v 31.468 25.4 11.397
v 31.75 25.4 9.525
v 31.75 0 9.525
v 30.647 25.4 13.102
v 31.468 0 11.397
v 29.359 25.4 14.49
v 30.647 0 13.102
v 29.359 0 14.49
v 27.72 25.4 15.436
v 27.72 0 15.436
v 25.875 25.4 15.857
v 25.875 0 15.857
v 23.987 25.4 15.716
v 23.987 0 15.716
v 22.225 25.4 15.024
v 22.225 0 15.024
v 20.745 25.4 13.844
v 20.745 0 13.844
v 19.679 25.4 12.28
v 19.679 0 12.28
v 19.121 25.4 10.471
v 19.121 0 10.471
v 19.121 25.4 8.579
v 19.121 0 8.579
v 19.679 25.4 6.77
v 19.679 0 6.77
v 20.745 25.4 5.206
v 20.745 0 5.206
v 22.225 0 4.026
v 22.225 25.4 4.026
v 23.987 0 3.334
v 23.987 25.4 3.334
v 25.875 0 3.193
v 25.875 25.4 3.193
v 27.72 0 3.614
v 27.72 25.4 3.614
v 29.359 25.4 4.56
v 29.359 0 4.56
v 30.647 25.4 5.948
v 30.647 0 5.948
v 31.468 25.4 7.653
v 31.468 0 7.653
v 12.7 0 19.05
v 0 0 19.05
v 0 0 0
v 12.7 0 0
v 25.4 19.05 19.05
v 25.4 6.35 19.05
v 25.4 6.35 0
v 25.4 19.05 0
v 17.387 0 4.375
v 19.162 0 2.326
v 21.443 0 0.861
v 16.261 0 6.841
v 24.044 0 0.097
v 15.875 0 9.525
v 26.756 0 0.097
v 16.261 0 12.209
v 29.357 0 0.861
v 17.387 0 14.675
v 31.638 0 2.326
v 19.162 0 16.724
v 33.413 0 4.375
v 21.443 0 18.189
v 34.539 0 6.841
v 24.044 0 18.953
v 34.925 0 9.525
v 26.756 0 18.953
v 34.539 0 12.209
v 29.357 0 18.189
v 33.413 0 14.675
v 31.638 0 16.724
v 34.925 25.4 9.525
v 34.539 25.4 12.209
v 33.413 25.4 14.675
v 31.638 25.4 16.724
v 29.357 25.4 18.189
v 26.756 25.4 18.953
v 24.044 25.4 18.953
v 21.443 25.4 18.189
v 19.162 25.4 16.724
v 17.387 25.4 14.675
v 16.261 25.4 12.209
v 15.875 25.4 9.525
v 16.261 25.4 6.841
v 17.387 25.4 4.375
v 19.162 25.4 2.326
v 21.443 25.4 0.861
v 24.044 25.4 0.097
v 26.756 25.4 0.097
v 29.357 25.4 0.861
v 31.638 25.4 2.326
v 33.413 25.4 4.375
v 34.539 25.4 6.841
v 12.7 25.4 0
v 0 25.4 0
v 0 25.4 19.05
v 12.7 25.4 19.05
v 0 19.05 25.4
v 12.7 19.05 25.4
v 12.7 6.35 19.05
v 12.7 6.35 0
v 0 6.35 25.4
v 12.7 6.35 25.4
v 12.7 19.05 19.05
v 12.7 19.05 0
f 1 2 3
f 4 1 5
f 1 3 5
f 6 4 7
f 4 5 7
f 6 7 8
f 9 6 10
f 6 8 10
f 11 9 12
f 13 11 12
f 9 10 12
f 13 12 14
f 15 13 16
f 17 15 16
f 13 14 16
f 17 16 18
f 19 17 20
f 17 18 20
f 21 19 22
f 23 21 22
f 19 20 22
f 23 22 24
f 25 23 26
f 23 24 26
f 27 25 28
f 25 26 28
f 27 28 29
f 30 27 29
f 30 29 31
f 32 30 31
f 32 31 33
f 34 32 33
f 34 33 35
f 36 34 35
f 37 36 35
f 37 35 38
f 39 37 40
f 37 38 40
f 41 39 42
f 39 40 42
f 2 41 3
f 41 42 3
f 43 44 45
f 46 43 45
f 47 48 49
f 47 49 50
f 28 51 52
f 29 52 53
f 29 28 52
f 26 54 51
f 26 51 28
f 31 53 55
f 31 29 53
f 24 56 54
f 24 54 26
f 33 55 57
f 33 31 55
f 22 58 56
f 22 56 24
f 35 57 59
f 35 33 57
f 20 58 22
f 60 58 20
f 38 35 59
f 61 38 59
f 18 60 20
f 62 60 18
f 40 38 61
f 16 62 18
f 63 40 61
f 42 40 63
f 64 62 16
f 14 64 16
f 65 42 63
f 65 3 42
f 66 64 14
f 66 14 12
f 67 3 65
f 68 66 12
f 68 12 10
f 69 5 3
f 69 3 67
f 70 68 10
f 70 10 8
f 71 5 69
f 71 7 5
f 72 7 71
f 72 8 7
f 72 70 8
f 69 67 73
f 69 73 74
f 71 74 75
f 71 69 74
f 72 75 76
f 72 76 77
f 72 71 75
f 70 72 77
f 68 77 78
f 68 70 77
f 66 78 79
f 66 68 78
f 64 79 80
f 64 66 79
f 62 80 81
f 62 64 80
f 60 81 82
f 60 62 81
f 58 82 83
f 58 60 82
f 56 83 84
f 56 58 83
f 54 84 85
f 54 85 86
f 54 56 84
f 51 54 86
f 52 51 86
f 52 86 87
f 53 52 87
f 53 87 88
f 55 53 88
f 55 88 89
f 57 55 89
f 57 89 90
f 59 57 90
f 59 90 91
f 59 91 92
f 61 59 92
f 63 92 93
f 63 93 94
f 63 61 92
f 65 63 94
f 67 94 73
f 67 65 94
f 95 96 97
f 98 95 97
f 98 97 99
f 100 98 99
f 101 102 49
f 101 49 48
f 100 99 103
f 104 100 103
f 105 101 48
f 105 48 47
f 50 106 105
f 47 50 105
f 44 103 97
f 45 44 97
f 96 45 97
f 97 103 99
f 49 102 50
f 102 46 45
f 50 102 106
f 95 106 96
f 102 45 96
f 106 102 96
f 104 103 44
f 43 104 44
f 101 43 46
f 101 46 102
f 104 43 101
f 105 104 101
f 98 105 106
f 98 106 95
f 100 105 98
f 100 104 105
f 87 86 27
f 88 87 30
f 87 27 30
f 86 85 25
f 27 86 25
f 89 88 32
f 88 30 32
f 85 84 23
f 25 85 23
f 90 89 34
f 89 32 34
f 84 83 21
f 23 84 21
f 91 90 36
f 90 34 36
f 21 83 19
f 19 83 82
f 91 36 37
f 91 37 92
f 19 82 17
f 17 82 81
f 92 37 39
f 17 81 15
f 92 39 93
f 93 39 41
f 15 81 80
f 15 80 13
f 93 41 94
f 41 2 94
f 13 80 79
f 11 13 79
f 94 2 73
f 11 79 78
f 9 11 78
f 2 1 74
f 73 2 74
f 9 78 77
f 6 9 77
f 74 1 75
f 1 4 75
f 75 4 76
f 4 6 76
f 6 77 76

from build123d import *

# Parameters (mm, degrees)
F1_DEPTH = 12.7
F2_W     = 12.7
F2_H     = 19.05
F3_DEPTH = 25.4
F4_R     = 9.525
F5_DEPTH = 25.4
F6_R     = 6.35
F7_DEPTH = 25.4


with BuildPart() as f1:
    # F0 (on Right) → F1 (new body)
    with BuildSketch(Plane.YZ):
        Polygon((0, 19.05), (0, 0), (25.4, 0), (25.4, 19.05), (19.05, 25.4), (6.35, 25.4), align=None)
    extrude(amount=F1_DEPTH)

    # F2 (on Right) → F3 (join)
    with BuildSketch(Plane.YZ):
        with Locations((12.7, 9.525)):
            Rectangle(F2_W, F2_H)
    extrude(amount=F3_DEPTH)


with BuildPart() as f5:
    # F4 (on Front) → F5 (new body)
    with BuildSketch(Plane.XZ):
        with Locations((25.4, 9.525)):
            Circle(F4_R)
    extrude(amount=-F5_DEPTH)

    # F6 (on face) → F7 (cut)
    with BuildSketch(Plane.XZ):
        with Locations((25.4, 9.525)):
            Circle(F6_R)
    extrude(amount=-F7_DEPTH, mode=Mode.SUBTRACT)


solid = Compound([f1.part, f5.part])
